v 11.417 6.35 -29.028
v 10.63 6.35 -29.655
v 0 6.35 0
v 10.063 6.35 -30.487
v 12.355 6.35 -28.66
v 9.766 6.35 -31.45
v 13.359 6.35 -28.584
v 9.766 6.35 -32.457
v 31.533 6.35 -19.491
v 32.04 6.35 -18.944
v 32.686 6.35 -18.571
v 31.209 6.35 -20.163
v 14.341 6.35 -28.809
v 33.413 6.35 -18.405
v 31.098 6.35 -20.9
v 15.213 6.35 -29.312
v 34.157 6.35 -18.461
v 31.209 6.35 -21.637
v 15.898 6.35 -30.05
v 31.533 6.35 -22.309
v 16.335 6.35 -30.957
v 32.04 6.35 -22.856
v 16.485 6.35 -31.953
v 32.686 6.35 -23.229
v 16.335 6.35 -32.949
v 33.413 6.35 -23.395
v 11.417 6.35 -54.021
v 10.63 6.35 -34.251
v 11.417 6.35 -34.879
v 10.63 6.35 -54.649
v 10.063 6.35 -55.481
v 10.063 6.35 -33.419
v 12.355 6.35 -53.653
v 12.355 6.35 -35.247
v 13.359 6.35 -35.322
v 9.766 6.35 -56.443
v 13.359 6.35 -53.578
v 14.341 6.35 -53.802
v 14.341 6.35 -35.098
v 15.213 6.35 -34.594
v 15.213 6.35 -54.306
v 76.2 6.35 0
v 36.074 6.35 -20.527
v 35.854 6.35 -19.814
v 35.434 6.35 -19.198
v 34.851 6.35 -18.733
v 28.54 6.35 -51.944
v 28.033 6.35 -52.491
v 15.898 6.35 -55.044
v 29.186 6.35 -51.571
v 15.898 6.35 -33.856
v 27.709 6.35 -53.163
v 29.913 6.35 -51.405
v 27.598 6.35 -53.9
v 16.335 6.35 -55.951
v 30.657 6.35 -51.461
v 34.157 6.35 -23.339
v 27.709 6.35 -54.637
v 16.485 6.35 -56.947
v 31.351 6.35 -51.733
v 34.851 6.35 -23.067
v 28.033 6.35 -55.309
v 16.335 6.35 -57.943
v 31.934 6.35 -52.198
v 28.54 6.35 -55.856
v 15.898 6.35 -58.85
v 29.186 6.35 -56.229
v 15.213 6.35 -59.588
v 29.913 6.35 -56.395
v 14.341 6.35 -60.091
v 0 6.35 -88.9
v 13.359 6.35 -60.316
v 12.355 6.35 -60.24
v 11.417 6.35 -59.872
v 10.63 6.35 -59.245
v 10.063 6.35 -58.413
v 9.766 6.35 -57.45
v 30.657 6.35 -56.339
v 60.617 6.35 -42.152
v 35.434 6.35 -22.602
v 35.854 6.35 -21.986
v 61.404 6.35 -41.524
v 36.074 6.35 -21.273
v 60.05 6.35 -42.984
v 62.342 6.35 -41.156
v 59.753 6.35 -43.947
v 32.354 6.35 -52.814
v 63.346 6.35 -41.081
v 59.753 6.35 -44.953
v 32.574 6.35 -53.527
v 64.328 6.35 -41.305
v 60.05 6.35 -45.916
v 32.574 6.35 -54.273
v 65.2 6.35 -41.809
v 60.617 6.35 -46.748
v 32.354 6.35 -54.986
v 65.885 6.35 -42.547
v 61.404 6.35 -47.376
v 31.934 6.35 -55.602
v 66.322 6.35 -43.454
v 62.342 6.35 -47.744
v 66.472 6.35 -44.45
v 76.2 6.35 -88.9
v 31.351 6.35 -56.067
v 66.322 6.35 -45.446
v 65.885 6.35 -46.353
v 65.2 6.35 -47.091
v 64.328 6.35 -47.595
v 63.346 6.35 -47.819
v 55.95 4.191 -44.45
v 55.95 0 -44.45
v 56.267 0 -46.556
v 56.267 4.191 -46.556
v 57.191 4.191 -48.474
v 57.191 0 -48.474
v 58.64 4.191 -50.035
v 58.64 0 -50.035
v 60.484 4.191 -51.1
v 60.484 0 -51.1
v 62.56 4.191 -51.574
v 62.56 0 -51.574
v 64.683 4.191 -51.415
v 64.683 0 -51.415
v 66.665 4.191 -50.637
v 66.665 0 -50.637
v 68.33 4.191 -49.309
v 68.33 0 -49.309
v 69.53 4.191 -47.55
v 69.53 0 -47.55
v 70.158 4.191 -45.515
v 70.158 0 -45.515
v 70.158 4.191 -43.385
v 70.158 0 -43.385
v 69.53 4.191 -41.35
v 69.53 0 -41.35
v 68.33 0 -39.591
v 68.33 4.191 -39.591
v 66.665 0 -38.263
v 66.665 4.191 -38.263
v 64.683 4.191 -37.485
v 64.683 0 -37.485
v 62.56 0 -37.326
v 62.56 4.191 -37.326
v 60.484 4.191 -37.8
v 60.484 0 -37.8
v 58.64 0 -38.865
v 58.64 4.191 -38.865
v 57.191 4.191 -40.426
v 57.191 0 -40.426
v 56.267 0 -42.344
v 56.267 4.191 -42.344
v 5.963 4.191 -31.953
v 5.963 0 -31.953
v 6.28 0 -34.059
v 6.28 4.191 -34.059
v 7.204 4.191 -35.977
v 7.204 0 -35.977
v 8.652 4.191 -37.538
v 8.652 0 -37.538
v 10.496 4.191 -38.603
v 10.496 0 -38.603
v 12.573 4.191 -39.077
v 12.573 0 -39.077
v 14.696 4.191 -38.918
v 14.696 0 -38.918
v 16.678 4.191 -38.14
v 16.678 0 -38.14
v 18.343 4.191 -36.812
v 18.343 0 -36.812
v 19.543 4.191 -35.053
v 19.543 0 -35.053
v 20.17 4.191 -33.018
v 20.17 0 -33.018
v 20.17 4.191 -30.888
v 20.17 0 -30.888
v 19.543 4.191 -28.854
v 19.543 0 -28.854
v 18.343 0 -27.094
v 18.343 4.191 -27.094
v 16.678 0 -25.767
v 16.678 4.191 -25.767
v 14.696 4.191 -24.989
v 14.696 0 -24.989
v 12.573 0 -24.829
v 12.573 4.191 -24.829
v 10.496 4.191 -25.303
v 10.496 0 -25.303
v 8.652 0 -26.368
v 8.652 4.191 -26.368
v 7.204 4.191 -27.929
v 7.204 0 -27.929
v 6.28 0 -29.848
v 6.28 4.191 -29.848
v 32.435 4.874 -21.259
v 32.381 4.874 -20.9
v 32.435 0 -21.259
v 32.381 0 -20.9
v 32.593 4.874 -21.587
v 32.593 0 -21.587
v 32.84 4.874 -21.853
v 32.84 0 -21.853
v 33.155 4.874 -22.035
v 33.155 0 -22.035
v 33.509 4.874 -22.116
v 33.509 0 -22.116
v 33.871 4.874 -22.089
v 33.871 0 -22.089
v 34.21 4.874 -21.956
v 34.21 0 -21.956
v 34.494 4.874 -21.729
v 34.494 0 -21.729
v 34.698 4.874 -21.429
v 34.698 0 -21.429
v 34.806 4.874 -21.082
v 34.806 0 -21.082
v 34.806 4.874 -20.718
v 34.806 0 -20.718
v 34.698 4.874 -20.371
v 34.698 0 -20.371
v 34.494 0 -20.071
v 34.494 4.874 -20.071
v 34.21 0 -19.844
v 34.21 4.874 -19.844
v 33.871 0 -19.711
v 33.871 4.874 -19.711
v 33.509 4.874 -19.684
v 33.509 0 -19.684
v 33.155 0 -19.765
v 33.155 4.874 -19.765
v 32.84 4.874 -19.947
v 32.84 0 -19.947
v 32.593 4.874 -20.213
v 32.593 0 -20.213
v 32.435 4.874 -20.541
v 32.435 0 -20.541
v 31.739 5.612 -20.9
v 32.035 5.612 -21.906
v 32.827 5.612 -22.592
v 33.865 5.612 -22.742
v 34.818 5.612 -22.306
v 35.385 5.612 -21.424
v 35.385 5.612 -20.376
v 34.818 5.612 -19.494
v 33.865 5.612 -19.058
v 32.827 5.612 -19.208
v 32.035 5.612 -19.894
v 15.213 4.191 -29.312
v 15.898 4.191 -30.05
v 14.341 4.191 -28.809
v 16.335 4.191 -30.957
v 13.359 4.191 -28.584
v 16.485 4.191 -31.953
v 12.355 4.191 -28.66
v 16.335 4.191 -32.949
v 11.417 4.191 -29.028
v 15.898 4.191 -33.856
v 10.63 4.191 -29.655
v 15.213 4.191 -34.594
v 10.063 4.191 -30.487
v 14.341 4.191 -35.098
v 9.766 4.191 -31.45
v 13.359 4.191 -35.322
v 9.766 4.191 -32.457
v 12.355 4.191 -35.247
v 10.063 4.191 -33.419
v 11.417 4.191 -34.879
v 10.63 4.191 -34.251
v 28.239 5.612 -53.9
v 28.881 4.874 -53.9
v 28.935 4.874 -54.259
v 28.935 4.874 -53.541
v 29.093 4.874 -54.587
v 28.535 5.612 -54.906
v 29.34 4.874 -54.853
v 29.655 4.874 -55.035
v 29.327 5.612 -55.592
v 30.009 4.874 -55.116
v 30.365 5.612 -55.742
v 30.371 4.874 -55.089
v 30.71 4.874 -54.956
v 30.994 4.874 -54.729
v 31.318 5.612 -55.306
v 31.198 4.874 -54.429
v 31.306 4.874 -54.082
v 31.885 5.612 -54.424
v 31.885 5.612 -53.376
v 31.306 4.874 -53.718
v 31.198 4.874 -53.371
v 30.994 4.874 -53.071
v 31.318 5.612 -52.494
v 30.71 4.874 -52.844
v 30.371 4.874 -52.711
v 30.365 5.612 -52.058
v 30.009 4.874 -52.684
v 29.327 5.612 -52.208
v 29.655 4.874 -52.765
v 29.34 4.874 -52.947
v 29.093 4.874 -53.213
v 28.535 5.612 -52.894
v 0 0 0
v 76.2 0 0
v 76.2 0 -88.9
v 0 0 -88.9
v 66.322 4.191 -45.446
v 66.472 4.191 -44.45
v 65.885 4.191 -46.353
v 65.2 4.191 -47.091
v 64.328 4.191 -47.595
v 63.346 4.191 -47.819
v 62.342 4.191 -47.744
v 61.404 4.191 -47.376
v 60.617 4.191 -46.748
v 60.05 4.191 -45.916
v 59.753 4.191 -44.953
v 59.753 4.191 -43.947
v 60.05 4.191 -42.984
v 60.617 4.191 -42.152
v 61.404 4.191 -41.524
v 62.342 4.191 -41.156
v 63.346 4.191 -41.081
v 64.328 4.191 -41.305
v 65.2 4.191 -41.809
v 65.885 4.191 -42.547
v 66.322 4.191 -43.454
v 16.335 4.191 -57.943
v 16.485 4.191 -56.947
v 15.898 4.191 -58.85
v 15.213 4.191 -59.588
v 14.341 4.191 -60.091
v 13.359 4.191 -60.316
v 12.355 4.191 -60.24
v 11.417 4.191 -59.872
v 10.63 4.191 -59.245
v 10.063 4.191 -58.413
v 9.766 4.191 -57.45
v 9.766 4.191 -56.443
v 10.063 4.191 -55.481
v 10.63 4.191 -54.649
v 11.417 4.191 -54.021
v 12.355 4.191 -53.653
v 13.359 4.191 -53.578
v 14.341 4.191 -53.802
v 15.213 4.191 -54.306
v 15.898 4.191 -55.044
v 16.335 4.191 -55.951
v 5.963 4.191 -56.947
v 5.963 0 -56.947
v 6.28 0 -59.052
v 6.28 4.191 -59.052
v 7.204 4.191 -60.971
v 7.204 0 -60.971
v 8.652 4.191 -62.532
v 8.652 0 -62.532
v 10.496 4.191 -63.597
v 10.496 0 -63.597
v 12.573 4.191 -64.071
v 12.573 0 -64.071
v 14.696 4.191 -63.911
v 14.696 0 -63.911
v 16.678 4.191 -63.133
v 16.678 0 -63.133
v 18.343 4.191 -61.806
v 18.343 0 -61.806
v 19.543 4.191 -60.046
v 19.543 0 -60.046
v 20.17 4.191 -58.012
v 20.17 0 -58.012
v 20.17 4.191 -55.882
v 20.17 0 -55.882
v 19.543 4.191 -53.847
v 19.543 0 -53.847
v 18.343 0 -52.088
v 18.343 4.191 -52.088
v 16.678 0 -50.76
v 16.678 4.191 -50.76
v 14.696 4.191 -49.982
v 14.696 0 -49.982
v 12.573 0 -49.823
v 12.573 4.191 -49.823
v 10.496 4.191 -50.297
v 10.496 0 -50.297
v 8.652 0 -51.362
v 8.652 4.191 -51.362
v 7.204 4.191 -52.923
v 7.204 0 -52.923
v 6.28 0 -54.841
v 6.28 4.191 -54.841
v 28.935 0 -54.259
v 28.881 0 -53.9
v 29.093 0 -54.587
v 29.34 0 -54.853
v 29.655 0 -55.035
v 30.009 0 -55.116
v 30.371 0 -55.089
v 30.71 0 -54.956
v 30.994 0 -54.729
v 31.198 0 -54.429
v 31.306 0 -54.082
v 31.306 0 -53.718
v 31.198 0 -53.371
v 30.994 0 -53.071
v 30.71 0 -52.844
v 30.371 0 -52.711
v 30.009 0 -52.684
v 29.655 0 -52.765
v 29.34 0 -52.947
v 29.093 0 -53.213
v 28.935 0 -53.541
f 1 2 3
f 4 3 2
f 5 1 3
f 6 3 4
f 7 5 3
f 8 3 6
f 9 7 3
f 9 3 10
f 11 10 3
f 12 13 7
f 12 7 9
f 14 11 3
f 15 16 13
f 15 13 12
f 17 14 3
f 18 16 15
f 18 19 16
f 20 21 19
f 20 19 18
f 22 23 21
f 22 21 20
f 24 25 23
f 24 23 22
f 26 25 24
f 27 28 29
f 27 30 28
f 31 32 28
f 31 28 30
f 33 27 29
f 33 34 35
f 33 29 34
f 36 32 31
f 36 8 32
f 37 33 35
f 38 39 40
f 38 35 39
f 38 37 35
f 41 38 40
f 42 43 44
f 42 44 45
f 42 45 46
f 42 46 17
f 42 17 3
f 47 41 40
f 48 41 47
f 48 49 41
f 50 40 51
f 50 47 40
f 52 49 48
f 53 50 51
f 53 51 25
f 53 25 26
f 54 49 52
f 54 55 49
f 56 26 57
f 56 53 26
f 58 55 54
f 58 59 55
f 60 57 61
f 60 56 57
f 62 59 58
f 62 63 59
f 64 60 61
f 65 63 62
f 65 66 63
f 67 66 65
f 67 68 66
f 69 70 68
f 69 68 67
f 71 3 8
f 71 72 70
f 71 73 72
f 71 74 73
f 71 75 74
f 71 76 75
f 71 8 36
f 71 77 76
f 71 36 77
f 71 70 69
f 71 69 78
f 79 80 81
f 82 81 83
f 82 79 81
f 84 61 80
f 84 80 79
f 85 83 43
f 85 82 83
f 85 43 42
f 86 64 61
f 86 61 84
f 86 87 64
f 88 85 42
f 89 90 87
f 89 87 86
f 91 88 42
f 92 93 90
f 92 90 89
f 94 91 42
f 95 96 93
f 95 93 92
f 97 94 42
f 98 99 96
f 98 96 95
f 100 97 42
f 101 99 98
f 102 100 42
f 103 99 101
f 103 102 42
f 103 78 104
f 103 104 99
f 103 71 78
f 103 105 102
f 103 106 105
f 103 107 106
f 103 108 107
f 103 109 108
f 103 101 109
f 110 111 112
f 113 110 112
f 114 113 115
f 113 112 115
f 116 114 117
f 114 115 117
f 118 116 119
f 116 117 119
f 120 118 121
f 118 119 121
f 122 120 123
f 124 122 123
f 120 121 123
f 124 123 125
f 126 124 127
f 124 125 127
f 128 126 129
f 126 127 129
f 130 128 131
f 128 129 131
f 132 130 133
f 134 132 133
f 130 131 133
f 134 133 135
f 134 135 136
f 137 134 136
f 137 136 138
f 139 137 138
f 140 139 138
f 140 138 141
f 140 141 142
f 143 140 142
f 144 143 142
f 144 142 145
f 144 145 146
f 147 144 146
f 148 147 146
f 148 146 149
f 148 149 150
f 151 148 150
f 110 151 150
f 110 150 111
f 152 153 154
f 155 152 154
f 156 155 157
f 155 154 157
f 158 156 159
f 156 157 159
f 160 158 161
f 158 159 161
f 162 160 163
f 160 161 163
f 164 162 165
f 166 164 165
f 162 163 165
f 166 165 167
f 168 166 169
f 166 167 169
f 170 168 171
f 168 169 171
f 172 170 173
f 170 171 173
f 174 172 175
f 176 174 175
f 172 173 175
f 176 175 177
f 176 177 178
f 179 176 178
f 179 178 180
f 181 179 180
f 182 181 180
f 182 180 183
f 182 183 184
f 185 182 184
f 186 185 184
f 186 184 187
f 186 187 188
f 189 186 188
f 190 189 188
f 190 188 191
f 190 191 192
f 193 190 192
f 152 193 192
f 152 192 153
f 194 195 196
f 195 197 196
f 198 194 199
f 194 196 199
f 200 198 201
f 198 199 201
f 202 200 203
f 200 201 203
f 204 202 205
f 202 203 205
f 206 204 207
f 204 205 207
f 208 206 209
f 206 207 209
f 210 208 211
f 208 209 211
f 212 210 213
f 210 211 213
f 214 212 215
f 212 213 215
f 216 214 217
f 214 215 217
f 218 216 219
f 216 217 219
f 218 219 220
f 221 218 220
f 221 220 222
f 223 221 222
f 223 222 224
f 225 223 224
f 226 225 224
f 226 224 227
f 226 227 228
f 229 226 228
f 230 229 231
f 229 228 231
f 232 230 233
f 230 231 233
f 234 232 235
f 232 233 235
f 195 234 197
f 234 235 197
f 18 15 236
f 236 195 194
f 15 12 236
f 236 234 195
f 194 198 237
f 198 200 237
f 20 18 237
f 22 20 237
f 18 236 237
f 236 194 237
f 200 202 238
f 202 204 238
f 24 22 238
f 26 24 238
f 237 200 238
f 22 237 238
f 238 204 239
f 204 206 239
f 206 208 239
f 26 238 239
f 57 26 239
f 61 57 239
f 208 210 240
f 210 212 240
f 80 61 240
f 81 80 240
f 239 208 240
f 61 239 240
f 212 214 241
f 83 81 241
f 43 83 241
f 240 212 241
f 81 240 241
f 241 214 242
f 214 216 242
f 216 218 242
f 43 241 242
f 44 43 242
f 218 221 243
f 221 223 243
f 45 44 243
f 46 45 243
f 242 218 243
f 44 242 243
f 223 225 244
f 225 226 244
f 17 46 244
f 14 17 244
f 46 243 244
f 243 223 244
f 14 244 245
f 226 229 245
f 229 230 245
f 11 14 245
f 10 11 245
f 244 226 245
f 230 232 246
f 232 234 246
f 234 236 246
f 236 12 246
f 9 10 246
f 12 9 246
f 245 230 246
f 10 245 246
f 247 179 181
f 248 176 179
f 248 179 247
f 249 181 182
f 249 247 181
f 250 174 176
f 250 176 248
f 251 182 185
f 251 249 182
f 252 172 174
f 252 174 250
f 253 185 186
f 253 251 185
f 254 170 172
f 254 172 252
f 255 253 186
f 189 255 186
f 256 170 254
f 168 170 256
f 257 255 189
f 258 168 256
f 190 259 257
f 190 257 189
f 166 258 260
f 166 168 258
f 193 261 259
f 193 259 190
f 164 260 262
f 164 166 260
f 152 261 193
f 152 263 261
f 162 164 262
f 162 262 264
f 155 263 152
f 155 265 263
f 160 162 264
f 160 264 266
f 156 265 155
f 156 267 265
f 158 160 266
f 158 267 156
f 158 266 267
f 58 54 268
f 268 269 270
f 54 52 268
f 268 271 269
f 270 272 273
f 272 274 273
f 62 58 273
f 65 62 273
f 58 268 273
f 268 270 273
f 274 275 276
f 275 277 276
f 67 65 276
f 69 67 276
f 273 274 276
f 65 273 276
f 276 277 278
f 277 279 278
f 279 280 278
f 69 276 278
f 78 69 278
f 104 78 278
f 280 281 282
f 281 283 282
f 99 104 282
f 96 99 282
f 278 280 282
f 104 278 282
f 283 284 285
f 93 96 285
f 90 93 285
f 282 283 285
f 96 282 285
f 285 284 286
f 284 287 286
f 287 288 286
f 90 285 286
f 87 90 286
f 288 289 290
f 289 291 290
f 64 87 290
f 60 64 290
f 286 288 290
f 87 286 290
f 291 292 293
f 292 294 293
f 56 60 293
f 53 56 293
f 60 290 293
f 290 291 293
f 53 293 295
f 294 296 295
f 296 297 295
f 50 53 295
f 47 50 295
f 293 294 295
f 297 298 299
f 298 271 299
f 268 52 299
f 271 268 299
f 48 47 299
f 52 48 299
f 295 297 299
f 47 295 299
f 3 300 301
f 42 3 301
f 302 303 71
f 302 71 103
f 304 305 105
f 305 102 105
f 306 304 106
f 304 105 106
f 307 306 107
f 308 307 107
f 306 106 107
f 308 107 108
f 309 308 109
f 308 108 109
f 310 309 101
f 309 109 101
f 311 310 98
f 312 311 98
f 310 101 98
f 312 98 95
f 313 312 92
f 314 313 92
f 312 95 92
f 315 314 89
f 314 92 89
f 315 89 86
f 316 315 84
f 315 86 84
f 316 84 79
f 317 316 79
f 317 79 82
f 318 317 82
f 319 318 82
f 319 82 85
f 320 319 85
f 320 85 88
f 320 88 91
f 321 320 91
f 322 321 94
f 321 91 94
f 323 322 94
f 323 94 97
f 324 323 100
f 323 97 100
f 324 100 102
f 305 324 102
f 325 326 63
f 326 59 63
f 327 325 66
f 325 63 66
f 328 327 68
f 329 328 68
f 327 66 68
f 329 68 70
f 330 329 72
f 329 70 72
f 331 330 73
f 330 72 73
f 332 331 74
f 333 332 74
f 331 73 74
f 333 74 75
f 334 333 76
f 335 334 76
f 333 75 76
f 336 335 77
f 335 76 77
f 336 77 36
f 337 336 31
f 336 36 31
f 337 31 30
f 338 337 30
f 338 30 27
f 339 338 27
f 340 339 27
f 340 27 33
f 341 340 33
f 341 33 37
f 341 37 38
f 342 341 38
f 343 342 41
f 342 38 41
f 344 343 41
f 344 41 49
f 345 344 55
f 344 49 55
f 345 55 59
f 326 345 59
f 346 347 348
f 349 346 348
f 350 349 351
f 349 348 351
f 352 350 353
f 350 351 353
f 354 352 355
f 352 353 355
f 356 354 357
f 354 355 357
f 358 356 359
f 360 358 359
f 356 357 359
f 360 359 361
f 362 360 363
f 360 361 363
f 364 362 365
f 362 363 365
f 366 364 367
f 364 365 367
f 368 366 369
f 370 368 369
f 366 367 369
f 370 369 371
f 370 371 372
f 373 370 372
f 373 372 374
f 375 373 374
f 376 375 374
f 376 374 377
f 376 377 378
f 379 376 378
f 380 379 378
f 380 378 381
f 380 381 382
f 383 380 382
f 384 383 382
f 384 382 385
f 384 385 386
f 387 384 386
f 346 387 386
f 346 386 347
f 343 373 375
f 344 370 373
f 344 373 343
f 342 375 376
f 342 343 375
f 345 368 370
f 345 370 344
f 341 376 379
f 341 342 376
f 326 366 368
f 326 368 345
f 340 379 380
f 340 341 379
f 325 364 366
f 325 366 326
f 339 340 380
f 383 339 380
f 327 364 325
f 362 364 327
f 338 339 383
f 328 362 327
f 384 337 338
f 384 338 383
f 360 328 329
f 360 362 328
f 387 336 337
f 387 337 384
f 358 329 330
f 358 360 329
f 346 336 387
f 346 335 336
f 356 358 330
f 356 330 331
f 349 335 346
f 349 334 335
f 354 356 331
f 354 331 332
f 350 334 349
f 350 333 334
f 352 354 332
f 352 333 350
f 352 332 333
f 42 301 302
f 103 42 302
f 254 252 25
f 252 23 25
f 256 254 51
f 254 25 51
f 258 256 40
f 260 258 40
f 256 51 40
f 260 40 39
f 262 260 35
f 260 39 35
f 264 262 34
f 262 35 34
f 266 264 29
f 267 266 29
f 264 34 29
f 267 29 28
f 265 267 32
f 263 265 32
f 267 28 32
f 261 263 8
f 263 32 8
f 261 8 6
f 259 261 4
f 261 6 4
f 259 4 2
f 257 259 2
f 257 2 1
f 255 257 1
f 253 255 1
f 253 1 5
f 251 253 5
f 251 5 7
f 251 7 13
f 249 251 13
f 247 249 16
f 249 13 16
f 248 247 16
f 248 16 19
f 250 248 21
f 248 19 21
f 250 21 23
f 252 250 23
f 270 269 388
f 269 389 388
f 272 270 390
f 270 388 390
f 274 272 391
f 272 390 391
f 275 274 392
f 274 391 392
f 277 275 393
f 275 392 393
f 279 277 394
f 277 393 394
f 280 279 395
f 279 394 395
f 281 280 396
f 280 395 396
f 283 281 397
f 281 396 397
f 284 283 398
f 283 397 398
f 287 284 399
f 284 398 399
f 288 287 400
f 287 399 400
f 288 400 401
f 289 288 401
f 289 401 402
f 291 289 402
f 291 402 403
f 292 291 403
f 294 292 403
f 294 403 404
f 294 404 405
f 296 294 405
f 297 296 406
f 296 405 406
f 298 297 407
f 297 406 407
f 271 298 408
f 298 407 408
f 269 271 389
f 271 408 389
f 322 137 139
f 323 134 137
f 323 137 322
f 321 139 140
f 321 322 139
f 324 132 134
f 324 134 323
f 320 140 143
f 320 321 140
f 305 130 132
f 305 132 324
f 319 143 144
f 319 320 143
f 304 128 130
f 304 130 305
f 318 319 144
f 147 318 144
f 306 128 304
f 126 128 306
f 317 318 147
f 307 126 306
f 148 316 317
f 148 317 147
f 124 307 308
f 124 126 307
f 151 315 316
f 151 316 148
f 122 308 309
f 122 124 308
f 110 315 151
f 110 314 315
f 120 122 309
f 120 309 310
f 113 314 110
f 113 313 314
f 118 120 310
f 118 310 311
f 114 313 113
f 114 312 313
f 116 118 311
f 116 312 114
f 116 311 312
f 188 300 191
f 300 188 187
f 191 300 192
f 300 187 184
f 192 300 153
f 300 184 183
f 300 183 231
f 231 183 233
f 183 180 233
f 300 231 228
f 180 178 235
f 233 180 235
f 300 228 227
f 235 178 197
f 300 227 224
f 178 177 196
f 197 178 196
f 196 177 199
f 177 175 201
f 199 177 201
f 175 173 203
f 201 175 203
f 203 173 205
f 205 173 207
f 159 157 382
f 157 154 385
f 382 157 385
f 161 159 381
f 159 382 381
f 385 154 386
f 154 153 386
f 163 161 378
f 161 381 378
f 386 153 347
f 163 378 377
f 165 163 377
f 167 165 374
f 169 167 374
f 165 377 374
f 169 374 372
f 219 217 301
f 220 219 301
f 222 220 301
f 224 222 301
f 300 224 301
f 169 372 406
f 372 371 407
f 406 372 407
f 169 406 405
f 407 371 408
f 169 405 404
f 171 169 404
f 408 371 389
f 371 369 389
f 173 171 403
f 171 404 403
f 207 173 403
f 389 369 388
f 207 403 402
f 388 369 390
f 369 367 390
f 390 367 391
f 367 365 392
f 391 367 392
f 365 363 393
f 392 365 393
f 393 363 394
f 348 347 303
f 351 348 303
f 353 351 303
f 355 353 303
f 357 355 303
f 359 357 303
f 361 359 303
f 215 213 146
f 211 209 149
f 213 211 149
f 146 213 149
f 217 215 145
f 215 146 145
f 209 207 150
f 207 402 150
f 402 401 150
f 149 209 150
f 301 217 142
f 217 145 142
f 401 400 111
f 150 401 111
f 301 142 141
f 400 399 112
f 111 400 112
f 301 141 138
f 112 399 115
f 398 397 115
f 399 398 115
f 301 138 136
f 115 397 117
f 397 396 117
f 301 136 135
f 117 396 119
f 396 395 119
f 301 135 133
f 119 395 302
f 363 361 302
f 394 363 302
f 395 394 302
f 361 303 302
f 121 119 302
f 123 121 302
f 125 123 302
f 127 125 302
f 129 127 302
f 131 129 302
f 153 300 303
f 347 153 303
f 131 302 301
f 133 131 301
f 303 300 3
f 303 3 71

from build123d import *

# Parameters (mm, degrees)
SKETCH1_W                                            = 76.2
SKETCH1_H                                            = 88.9
BOSS_EXTRUDE1_DEPTH                                  = 6.35
CSK_FOR_2_FLAT_HEAD_SOCKET_CAP_SCREW1_D              = 2.4384
CSK_FOR_2_FLAT_HEAD_SOCKET_CAP_SCREW1_DEPTH          = 6.4
CSK_FOR_2_FLAT_HEAD_SOCKET_CAP_SCREW1_CSINK_D        = 5.0038
CSK_FOR_2_FLAT_HEAD_SOCKET_CAP_SCREW1_CSINK_ANGLE    = 82
CSK_FOR_2_FLAT_HEAD_SOCKET_CAP_SCREW1_TIP            = 0.732569267
CBORE_FOR_1_4_BINDING_HEAD_MACHINE_SCREW_D           = 6.7564
CBORE_FOR_1_4_BINDING_HEAD_MACHINE_SCREW_DEPTH       = 6.4
CBORE_FOR_1_4_BINDING_HEAD_MACHINE_SCREW_CBORE_D     = 14.2875
CBORE_FOR_1_4_BINDING_HEAD_MACHINE_SCREW_CBORE_DEPTH = 4.191
CBORE_FOR_1_4_BINDING_HEAD_MACHINE_SCREW_TIP         = 2.029827343


with BuildPart() as part:
    # Sketch1 → Boss-Extrude1 (new body)
    with BuildSketch(Plane(origin=(0, 0, 0), x_dir=(1, 0, 0), z_dir=(0, 1, 0))):
        with Locations((38.1, 44.45)):
            Rectangle(SKETCH1_W, SKETCH1_H)
    extrude(amount=BOSS_EXTRUDE1_DEPTH)

    # CSK for #2 Flat Head Socket Cap Screw1
    with Locations(Plane(origin=(0, 6.35, 0), x_dir=(1, 0, 0), z_dir=(0, 1, 0))):
        with Locations((33.6, 20.9), (30.1, 53.9)):
            CounterSinkHole(CSK_FOR_2_FLAT_HEAD_SOCKET_CAP_SCREW1_D / 2, CSK_FOR_2_FLAT_HEAD_SOCKET_CAP_SCREW1_CSINK_D / 2, depth=CSK_FOR_2_FLAT_HEAD_SOCKET_CAP_SCREW1_DEPTH, counter_sink_angle=CSK_FOR_2_FLAT_HEAD_SOCKET_CAP_SCREW1_CSINK_ANGLE)
            with Locations((0, 0, -(CSK_FOR_2_FLAT_HEAD_SOCKET_CAP_SCREW1_DEPTH + CSK_FOR_2_FLAT_HEAD_SOCKET_CAP_SCREW1_TIP / 2))):  # 118° drill point
                Cone(0, CSK_FOR_2_FLAT_HEAD_SOCKET_CAP_SCREW1_D / 2, CSK_FOR_2_FLAT_HEAD_SOCKET_CAP_SCREW1_TIP, mode=Mode.SUBTRACT)

    # CBORE for 1/4 Binding Head Machine Screw1
    with Locations(Plane(origin=(0, 0, 0), x_dir=(-1, 0, 0), z_dir=(0, -1, 0))):
        with Locations((-63.0936, 44.45), (-13.1064, 31.9532), (-13.1064, 56.9468)):
            CounterBoreHole(CBORE_FOR_1_4_BINDING_HEAD_MACHINE_SCREW_D / 2, CBORE_FOR_1_4_BINDING_HEAD_MACHINE_SCREW_CBORE_D / 2, CBORE_FOR_1_4_BINDING_HEAD_MACHINE_SCREW_CBORE_DEPTH, depth=CBORE_FOR_1_4_BINDING_HEAD_MACHINE_SCREW_DEPTH)
            with Locations((0, 0, -(CBORE_FOR_1_4_BINDING_HEAD_MACHINE_SCREW_DEPTH + CBORE_FOR_1_4_BINDING_HEAD_MACHINE_SCREW_TIP / 2))):  # 118° drill point
                Cone(0, CBORE_FOR_1_4_BINDING_HEAD_MACHINE_SCREW_D / 2, CBORE_FOR_1_4_BINDING_HEAD_MACHINE_SCREW_TIP, mode=Mode.SUBTRACT)


solid = part.part
